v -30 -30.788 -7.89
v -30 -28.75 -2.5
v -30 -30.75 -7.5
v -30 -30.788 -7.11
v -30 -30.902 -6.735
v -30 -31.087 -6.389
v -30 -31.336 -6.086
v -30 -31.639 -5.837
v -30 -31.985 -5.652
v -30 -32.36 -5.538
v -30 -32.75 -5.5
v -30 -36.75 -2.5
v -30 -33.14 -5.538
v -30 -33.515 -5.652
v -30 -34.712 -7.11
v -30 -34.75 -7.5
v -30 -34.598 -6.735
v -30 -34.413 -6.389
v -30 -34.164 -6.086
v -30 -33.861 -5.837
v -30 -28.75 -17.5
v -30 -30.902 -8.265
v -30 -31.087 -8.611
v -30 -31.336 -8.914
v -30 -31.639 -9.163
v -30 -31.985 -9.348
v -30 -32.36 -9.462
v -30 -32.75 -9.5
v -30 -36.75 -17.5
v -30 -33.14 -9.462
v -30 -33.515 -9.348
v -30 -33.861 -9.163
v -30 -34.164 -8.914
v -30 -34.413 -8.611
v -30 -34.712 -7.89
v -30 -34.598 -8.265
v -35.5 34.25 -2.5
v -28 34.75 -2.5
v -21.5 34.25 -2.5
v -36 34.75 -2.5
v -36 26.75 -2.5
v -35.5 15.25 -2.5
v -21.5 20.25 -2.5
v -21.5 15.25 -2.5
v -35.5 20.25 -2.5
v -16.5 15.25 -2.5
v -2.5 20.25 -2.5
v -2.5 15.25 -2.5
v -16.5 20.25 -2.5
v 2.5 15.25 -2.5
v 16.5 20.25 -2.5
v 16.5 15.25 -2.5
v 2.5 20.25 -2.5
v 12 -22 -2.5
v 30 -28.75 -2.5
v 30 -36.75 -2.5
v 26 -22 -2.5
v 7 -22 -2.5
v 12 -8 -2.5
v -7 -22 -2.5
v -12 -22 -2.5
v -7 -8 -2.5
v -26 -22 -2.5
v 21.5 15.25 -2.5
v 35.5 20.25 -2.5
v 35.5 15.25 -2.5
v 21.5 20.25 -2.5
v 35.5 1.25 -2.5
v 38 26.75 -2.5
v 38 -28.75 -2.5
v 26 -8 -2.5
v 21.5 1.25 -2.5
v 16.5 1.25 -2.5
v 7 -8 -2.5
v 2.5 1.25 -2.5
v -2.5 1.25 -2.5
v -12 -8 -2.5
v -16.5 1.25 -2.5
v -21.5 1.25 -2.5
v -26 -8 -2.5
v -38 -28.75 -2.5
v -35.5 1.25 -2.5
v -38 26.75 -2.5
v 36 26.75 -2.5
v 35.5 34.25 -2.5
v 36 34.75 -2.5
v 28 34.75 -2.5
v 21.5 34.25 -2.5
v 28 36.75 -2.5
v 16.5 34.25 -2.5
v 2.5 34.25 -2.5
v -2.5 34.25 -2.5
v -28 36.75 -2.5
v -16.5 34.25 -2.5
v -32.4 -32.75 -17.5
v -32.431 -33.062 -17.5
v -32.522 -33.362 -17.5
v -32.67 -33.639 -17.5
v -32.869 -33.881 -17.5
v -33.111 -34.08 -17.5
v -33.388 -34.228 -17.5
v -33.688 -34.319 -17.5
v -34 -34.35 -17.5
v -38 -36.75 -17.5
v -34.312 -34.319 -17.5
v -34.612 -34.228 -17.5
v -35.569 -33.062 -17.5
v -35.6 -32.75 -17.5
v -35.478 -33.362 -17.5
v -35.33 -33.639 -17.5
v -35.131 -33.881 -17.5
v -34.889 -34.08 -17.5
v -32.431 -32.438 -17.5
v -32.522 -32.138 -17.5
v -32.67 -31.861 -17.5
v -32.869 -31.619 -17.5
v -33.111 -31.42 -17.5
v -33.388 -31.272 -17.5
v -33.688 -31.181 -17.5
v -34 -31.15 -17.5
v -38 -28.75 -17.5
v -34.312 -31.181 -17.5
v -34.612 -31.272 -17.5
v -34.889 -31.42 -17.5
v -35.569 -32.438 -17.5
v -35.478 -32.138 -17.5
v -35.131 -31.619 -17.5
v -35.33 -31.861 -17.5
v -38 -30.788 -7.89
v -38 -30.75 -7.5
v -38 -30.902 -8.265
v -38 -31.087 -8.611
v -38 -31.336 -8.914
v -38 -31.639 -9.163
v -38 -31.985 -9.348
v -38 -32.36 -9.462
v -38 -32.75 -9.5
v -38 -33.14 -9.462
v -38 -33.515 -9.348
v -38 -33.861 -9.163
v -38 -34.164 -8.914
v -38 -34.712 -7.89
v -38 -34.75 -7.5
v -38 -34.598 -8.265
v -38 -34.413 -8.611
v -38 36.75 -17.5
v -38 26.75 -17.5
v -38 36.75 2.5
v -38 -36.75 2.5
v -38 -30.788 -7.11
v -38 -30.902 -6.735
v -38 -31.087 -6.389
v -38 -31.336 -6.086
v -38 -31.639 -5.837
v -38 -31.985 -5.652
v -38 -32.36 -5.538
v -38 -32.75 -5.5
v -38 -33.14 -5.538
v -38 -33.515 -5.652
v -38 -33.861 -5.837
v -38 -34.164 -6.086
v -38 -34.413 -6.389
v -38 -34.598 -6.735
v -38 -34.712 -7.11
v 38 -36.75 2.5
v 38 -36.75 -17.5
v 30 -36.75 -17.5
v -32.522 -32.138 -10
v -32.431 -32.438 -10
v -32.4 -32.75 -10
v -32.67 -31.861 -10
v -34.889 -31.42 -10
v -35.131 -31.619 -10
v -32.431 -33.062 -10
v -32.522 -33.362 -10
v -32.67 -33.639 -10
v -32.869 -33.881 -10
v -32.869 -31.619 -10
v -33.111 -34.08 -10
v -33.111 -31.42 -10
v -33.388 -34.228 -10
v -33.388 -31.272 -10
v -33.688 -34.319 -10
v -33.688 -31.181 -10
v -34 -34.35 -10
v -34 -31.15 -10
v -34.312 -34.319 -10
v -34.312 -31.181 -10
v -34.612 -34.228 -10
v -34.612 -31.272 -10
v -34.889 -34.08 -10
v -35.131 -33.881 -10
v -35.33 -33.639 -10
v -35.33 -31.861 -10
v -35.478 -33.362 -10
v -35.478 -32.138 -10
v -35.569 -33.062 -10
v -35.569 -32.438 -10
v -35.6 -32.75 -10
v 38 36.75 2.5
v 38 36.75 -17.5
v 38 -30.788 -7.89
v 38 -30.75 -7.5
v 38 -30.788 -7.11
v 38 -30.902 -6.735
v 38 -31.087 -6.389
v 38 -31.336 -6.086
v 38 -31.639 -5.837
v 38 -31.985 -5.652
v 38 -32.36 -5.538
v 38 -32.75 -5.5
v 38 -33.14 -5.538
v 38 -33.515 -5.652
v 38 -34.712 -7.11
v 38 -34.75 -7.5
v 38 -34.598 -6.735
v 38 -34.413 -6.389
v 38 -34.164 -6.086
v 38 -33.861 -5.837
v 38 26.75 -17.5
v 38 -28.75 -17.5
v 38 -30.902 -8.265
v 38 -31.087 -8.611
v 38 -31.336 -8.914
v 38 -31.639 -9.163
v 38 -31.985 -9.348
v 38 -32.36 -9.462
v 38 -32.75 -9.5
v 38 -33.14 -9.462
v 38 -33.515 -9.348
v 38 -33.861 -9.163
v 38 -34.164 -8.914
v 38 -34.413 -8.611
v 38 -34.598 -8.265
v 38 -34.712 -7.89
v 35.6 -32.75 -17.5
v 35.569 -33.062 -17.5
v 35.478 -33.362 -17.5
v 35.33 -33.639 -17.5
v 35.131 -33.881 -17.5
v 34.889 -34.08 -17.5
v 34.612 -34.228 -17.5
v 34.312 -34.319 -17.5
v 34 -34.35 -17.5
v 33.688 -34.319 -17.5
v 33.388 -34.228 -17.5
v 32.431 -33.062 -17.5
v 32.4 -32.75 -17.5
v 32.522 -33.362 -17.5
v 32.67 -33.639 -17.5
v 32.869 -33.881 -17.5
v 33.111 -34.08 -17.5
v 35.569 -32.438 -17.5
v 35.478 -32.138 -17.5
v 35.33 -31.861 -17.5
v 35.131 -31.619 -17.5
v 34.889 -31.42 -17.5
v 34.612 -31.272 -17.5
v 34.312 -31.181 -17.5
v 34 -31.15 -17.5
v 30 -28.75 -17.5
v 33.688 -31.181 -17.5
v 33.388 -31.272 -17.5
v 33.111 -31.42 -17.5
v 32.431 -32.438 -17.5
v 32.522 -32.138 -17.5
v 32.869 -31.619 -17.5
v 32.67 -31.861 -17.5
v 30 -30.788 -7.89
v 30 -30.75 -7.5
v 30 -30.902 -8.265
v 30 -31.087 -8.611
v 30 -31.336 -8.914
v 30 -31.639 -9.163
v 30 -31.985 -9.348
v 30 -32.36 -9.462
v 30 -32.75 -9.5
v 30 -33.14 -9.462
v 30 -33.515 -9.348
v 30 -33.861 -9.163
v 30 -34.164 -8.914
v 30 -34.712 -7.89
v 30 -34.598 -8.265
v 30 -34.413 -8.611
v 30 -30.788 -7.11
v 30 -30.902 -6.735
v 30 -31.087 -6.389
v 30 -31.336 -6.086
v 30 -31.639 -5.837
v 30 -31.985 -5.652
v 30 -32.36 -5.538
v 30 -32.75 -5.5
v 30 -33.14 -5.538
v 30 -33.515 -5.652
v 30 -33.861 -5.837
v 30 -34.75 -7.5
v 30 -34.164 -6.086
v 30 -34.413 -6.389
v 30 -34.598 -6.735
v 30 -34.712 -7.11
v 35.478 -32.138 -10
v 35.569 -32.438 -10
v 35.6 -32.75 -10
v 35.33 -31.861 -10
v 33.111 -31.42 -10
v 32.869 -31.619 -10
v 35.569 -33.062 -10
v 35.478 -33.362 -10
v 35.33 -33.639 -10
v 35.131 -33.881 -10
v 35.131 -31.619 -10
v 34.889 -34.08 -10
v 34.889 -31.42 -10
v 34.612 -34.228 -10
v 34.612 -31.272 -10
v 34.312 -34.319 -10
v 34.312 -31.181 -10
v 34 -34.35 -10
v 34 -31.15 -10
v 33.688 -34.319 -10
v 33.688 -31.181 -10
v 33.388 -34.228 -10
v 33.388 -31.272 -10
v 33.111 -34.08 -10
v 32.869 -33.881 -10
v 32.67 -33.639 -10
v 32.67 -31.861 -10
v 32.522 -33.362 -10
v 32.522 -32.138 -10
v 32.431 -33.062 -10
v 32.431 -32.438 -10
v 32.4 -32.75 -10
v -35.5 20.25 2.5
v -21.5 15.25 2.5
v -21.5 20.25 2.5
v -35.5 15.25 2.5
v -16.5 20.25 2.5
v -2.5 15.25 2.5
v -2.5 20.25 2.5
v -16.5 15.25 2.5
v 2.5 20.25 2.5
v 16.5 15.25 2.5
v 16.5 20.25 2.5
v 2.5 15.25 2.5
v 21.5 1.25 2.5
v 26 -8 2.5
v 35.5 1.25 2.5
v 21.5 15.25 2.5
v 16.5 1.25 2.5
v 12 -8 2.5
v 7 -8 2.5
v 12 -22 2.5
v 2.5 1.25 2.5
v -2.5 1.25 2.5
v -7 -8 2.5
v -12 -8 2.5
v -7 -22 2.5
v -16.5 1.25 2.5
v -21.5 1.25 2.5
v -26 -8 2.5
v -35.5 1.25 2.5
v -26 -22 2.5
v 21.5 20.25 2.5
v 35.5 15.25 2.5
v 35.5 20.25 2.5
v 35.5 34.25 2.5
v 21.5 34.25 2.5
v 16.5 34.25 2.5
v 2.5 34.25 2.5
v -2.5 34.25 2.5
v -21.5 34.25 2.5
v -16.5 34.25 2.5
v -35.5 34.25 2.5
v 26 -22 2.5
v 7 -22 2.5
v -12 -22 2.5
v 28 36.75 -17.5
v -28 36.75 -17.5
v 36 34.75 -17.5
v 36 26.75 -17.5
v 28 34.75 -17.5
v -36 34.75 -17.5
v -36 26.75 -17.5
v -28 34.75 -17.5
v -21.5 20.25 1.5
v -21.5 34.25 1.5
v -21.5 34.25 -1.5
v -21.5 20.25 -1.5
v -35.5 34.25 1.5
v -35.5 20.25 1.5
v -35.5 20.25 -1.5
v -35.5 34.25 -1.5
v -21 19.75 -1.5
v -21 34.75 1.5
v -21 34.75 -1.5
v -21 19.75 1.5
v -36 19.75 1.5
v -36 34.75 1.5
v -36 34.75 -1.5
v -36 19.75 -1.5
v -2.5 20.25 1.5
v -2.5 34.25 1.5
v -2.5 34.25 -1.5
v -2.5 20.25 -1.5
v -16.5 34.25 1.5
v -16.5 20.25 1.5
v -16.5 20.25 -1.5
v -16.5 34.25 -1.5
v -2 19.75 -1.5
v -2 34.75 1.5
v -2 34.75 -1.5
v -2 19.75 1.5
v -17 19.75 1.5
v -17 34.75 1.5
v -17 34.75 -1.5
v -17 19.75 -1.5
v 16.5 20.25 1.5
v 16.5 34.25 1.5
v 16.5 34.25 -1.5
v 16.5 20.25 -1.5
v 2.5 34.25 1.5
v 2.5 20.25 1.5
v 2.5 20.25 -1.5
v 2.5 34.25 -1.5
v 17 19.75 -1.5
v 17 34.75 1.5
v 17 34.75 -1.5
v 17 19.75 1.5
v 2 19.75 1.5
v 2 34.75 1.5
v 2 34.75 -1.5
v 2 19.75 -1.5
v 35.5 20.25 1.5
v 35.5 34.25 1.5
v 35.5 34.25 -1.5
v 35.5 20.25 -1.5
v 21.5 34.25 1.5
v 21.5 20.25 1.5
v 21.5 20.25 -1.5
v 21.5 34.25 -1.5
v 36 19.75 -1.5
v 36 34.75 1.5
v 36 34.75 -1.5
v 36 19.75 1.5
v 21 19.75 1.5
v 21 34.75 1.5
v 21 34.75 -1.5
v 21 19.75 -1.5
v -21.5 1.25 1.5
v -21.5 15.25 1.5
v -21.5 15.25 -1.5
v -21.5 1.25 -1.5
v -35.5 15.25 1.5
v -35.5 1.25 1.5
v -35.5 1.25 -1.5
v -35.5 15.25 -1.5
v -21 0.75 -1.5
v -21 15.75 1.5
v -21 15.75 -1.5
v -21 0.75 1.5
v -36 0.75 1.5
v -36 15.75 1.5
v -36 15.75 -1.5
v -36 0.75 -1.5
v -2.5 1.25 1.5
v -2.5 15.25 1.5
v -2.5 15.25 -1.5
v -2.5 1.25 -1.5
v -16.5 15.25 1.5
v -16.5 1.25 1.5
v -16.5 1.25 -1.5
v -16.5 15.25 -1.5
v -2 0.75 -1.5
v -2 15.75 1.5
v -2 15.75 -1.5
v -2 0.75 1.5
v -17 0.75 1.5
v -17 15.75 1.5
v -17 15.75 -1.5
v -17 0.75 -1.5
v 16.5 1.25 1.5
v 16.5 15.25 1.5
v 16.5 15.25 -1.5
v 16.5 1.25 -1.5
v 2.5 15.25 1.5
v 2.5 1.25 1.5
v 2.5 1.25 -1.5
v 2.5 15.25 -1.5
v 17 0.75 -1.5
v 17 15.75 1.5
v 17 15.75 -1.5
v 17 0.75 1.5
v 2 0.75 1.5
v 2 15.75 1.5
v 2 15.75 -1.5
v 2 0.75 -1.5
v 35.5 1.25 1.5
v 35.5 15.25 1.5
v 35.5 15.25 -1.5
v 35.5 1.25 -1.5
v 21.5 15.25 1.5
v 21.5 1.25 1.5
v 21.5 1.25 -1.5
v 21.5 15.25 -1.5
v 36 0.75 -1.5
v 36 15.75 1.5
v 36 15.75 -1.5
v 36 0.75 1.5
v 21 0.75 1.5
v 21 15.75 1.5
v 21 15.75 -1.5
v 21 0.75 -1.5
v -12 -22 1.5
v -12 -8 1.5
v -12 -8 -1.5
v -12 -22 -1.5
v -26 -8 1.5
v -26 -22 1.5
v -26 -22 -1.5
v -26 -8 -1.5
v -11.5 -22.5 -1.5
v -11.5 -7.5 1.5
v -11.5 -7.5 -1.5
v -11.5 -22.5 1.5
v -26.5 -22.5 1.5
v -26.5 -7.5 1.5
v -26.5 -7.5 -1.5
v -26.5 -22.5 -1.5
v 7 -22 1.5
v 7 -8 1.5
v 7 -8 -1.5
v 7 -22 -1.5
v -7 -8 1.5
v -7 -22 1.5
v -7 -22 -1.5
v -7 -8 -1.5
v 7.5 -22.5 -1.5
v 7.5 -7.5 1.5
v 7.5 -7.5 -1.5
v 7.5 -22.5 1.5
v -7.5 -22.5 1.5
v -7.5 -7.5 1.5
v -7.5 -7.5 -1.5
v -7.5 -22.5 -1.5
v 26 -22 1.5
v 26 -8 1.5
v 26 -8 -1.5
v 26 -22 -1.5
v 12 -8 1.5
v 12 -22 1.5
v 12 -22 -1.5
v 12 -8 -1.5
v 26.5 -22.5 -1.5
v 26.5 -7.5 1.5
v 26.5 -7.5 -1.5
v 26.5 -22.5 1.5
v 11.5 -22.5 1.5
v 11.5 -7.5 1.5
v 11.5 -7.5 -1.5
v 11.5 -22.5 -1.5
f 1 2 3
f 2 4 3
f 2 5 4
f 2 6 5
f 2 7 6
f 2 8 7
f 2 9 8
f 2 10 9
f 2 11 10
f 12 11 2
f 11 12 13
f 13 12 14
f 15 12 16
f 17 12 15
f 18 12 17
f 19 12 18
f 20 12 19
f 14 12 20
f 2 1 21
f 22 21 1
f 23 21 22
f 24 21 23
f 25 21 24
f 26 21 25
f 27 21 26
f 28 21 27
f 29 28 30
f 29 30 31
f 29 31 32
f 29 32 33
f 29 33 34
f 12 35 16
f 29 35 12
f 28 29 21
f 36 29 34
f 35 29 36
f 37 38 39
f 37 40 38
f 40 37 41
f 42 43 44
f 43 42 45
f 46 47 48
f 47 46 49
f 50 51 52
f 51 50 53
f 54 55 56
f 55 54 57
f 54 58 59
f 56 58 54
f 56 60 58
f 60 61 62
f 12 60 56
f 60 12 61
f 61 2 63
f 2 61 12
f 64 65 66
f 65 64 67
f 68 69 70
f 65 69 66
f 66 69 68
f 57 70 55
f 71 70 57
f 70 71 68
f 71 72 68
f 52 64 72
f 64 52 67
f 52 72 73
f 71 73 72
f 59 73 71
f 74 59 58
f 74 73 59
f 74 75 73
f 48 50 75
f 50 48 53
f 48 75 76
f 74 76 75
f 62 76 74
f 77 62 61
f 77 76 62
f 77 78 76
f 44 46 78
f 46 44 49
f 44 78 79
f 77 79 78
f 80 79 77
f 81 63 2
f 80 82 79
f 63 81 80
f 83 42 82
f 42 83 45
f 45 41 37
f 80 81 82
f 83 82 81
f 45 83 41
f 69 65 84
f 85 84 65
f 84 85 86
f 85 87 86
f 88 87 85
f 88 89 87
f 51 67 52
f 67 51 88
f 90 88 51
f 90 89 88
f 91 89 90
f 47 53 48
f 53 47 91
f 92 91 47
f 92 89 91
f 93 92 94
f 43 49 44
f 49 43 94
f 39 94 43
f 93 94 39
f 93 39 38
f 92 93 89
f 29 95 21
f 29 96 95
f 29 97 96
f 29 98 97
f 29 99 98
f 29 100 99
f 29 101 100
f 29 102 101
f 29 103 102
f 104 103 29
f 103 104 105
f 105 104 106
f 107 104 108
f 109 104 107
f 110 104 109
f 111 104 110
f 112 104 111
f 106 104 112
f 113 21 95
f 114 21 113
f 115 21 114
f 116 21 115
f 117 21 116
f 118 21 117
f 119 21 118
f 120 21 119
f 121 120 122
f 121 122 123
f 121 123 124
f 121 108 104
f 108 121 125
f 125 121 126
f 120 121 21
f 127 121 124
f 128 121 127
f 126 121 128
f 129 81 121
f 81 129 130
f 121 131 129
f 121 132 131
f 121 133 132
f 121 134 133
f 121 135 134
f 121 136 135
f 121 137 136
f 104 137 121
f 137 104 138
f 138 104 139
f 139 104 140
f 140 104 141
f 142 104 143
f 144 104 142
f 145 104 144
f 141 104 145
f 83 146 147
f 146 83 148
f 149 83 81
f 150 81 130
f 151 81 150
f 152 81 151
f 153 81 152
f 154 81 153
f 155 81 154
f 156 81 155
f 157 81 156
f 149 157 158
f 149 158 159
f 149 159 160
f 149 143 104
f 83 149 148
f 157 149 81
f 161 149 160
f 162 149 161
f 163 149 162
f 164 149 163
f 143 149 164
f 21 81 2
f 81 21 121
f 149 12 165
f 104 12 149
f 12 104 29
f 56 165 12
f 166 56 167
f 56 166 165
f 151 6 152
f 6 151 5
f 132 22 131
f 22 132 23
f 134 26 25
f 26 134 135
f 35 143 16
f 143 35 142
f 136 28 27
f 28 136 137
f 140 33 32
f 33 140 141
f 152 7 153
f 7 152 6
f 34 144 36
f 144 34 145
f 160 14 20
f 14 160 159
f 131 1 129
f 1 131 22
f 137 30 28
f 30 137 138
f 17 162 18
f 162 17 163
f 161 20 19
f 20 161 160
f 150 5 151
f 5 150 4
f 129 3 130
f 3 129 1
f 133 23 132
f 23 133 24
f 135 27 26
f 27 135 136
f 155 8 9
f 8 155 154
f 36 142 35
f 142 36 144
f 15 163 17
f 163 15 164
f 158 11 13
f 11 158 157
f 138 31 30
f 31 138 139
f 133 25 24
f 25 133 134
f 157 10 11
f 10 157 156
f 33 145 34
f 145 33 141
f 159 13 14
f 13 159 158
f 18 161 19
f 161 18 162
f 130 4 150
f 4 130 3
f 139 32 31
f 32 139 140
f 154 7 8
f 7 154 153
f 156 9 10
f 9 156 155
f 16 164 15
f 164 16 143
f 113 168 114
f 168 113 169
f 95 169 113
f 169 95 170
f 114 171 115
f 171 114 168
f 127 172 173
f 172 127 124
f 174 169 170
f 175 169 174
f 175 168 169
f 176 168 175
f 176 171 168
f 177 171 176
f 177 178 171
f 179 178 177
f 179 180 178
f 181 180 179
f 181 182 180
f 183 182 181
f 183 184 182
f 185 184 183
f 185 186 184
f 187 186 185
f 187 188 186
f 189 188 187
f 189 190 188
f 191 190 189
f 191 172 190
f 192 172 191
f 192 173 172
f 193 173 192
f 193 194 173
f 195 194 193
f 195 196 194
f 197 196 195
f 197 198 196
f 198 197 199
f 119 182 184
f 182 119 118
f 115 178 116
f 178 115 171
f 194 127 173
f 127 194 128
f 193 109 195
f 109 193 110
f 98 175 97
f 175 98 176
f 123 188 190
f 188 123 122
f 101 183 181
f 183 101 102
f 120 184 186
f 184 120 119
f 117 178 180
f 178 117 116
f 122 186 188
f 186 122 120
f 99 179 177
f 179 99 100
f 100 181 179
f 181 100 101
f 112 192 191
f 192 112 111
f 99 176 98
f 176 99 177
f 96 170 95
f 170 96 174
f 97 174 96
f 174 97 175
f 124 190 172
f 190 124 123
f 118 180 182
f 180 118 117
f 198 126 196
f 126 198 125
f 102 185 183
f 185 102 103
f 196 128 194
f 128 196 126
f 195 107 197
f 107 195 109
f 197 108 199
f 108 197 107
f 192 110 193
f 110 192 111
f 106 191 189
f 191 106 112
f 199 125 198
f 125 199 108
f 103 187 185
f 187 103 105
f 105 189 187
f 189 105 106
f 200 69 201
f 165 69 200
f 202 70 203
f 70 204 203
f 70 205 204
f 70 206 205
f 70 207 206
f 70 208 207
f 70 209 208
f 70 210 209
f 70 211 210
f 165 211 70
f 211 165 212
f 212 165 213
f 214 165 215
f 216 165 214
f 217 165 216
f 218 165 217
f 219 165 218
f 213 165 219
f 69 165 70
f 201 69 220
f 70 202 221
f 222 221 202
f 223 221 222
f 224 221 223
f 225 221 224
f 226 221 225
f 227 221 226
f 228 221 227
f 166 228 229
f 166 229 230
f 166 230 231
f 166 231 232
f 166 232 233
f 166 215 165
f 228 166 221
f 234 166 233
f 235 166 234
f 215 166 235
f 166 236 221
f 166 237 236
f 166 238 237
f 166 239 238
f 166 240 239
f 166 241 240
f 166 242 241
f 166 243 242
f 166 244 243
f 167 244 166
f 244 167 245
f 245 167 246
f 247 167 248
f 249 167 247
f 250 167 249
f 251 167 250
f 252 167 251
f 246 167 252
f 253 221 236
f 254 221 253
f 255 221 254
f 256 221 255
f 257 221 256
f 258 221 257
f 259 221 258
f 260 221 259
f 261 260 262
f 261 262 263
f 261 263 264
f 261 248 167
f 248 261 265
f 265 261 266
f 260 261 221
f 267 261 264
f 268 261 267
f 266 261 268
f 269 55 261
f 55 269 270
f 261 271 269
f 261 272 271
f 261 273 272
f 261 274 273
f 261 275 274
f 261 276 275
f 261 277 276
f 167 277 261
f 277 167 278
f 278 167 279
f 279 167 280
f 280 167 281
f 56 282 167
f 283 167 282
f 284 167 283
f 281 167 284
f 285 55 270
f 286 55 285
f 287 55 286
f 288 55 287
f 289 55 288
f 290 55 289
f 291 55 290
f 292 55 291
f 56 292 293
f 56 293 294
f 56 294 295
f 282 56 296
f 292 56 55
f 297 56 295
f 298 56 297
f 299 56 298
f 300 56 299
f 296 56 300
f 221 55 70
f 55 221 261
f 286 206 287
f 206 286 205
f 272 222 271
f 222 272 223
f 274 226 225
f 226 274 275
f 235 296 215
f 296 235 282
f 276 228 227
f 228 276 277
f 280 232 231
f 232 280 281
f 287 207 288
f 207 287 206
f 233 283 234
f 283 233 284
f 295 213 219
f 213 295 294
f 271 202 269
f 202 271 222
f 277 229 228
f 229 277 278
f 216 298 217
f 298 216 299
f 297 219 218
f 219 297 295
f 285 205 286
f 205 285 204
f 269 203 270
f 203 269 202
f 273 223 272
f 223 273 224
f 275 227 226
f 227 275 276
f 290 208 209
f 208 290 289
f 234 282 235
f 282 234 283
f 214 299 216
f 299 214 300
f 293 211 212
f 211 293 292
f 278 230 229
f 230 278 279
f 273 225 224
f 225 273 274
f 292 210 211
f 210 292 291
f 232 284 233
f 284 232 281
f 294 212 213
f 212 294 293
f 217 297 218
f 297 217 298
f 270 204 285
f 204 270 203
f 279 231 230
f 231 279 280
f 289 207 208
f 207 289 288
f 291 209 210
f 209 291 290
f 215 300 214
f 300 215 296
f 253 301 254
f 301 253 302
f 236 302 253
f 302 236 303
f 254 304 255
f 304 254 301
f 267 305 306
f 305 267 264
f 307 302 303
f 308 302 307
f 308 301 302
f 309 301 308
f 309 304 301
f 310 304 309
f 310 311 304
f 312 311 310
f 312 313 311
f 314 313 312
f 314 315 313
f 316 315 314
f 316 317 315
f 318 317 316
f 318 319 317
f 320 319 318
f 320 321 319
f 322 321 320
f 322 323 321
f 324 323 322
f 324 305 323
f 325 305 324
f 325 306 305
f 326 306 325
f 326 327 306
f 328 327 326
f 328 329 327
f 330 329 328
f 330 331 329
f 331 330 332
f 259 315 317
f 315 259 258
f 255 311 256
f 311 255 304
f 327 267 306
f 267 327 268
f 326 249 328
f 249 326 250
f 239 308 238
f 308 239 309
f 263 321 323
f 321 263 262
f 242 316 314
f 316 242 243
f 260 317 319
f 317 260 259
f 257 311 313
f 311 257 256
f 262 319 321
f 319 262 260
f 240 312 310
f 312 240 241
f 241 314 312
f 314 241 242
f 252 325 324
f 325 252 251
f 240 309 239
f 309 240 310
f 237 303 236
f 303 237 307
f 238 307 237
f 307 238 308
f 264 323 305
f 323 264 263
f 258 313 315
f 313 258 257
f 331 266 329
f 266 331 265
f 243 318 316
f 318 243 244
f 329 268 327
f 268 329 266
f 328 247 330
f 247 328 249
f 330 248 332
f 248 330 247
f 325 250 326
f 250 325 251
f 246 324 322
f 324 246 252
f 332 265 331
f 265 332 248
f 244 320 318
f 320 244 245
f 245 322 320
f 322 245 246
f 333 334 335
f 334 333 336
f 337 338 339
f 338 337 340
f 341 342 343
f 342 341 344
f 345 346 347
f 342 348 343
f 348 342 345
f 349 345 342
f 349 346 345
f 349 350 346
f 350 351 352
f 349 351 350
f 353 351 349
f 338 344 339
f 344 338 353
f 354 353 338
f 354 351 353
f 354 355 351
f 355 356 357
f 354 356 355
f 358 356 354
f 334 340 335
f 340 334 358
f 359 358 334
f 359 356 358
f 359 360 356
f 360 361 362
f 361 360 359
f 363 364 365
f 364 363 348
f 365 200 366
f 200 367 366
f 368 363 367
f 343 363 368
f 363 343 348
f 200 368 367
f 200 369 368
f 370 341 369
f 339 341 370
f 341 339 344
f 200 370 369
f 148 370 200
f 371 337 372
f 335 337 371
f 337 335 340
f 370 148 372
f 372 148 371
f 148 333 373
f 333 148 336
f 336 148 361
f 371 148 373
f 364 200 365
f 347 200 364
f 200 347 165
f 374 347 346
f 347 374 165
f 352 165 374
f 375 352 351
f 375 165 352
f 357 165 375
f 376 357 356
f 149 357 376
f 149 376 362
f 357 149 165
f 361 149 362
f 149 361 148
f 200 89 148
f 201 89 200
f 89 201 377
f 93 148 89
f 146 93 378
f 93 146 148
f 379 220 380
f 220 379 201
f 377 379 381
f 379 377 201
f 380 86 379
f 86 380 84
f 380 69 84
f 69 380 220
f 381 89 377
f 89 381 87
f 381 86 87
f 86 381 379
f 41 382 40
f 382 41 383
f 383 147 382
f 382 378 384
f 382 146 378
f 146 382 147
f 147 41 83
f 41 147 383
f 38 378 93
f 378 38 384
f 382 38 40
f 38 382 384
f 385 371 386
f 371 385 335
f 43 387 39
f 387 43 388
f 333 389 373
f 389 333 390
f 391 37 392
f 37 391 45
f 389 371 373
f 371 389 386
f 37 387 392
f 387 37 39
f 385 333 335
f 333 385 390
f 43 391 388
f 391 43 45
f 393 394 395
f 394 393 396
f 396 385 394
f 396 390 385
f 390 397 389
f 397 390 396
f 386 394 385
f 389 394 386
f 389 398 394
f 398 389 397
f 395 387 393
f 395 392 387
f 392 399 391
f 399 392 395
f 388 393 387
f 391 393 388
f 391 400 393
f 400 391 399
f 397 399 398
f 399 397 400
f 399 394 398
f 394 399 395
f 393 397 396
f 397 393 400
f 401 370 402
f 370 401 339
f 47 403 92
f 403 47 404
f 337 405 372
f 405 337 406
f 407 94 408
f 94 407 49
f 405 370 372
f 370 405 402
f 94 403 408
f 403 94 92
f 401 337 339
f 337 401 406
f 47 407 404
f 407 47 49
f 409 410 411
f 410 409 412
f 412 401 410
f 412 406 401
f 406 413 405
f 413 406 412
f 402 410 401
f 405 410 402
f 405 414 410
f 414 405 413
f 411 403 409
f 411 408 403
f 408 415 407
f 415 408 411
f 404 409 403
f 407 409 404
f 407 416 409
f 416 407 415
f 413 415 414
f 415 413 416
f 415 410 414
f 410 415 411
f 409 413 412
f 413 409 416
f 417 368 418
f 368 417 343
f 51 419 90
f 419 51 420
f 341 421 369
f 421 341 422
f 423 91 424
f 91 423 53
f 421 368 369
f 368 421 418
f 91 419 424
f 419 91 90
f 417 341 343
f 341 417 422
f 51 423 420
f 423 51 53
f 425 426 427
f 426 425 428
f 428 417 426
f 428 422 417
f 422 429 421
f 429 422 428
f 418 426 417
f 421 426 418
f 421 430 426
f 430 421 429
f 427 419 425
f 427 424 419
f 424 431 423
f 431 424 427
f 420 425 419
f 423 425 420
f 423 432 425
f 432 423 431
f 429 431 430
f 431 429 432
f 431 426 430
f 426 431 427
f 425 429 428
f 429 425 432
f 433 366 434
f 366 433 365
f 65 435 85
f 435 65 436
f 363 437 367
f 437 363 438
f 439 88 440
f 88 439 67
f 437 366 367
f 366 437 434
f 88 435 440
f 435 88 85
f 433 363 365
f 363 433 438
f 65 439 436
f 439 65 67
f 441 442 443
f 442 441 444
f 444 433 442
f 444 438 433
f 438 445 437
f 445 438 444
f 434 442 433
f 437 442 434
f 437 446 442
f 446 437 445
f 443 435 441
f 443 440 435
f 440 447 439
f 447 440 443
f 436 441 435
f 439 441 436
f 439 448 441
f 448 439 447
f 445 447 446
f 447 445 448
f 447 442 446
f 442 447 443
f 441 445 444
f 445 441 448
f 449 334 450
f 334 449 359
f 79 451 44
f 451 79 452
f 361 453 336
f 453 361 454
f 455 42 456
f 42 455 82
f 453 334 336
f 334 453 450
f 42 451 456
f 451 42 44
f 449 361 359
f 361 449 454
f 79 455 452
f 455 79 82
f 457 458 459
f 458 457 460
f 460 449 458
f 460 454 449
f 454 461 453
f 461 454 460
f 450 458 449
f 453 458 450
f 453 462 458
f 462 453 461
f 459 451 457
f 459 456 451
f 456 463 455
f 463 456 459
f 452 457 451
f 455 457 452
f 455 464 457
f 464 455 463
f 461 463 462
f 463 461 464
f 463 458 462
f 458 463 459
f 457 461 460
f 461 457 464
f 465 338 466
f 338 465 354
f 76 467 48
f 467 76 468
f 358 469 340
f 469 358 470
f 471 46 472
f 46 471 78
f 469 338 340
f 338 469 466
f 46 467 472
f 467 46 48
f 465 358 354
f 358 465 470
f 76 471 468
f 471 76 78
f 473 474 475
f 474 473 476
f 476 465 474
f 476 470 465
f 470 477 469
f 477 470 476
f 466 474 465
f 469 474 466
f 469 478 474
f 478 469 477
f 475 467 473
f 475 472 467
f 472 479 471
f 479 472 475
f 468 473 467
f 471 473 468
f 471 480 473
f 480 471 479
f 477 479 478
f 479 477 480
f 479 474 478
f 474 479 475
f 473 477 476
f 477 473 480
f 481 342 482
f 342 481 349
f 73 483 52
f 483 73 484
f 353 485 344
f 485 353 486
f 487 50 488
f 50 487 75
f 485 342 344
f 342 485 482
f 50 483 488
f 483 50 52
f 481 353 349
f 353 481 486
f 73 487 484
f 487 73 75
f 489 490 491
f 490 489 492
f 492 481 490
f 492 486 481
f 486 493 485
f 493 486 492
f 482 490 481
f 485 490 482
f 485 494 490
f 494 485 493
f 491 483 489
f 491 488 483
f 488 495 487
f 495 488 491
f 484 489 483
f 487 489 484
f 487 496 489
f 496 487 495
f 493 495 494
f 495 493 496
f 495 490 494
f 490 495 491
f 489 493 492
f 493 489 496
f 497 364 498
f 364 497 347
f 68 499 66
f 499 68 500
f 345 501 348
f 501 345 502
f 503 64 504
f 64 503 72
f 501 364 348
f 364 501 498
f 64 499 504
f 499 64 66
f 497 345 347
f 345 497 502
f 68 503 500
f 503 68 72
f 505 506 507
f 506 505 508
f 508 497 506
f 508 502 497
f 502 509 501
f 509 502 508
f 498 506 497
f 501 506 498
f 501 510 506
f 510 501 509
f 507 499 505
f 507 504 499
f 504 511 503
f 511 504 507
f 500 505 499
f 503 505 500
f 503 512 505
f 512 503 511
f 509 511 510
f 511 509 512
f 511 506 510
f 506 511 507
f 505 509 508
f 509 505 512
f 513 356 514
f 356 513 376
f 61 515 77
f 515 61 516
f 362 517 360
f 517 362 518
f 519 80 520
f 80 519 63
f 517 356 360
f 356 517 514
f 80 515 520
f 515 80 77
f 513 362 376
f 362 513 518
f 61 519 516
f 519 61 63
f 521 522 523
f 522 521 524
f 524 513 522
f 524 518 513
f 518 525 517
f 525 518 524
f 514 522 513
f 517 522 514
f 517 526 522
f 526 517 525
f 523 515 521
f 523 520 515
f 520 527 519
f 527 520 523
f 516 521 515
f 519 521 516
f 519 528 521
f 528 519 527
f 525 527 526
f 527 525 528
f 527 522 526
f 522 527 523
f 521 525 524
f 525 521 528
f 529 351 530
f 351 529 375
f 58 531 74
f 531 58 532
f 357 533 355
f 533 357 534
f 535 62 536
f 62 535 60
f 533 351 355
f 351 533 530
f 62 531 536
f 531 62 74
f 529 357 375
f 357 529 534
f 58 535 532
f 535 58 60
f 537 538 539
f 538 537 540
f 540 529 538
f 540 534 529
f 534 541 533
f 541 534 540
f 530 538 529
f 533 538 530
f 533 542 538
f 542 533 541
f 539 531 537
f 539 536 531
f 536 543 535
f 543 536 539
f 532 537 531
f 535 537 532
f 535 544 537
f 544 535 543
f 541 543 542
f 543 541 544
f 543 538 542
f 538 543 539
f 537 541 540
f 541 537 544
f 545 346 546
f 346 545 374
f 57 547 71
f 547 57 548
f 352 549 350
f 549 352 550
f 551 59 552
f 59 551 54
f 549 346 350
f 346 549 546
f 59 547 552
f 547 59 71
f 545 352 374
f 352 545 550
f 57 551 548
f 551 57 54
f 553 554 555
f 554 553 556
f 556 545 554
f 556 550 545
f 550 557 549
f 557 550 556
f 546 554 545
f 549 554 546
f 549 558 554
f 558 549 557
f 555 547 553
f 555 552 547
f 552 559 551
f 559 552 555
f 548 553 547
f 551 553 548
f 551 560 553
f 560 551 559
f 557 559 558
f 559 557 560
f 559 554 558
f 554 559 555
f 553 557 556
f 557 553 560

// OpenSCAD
// file: common.scad
key_size = 14;
stabilizer_size = 3.5;

b_post = 8;
m_post_s = 2;
m_post_l = 10;
post_z = 15;

plat_z = 5;

module keyhole(x, y) {
  translate([x, y, 0]) {
    cube([key_size, key_size, plat_z + 1], center = true);
    cube([key_size + 1, key_size + 1, plat_z - 2], center = true);
  }
}

module double_wide(x, y) {
  keyhole(x, y);
  for (offset=[-12, 12]) {
     translate([x + offset, y - 1, 0]) {
       cube([stabilizer_size, key_size, plat_z + 1], center = true);
       translate([0, key_size/2, 0])
         cube([stabilizer_size, 1, plat_z - 2], center = true);
       translate([0, -key_size/2, 0])
         cube([stabilizer_size, 2, plat_z - 2], center = true);
     }
  }
}

module e_post(x, y, z) {
  translate([x, y, -(plat_z + post_z)/2]) {
    difference() {
      cube([b_post, b_post, post_z], center = true);
      translate([0, 0, -post_z/2]) cylinder(h=post_z, r=1.6, center=true, $fn=32);
    }
  }
}

module e_post_i(x, y, r) {
  translate([x, y, -(plat_z + post_z)/2]) {
    difference() {
      cube([b_post, b_post, post_z], center = true);
      translate([0, 0, post_z/6]) rotate(r) cylinder(h=b_post+1, r=2, center=true, $fn=32);
      translate([0, 0, -post_z/2]) cylinder(h=post_z, r=1.6, center=true, $fn=32);
    }
  }
}

module e_post_x(x, y) {
  e_post_i(x, y, [0, 90, 0]);
}


module e_post_y(x, y) {
  e_post_i(x, y, [90, 0, 0]);
}

module i_post_x(x, y) {
  translate([x, y, -(plat_z + post_z)/2]) cube([m_post_l, m_post_s, post_z], center = true);
}

module i_post_y(x, y) {
  translate([x, y, -(plat_z + post_z)/2]) cube([m_post_s, m_post_l, post_z], center = true);
}
// file: parameters.scad
key_size = 14;
key_sep = 5;
m_key_sep = 13.5;
l_key_sep = 33;

border = 8;
b_post = 8;
m_post_s = 2;
m_post_l = 10;
post_z = 15;

key_cell = key_size + key_sep;
m_key_cell_x = key_size + m_key_sep;
l_key_cell_x = 2*key_cell;

plat_z = 5;
// main file
// Alien bat sections 6 and 7: bottom center sections

include <parameters.scad>

plat_x = 4 * key_cell;
plat_y = border + 2 * key_cell + m_key_cell_x;

use <common.scad>

difference() {
  union() {
    cube([plat_x, plat_y, 5], center = true);
    e_post_x(-(plat_x-b_post)/2, -(plat_y-b_post)/2);
    e_post_x((plat_x-b_post)/2, -(plat_y-b_post)/2);

    i_post_y((plat_x-m_post_s)/2, (plat_y-m_post_l)/2);
    i_post_x((plat_x-m_post_l)/2, (plat_y-m_post_s)/2);
    i_post_y(-(plat_x-m_post_s)/2, (plat_y-m_post_l)/2);
    i_post_x(-(plat_x-m_post_l)/2, (plat_y-m_post_s)/2);
  }

  for (row = [0:1]) {
    for (col = [0:3]) {
      keyhole(-plat_x/2 + col*key_cell + key_cell/2, plat_y/2 - row*key_cell - key_cell/2);
    }
  }
  for (col = [0:2]) {
    keyhole(-key_cell + col*key_cell, -plat_y/2 + border + m_key_cell_x/2);
  }
}
